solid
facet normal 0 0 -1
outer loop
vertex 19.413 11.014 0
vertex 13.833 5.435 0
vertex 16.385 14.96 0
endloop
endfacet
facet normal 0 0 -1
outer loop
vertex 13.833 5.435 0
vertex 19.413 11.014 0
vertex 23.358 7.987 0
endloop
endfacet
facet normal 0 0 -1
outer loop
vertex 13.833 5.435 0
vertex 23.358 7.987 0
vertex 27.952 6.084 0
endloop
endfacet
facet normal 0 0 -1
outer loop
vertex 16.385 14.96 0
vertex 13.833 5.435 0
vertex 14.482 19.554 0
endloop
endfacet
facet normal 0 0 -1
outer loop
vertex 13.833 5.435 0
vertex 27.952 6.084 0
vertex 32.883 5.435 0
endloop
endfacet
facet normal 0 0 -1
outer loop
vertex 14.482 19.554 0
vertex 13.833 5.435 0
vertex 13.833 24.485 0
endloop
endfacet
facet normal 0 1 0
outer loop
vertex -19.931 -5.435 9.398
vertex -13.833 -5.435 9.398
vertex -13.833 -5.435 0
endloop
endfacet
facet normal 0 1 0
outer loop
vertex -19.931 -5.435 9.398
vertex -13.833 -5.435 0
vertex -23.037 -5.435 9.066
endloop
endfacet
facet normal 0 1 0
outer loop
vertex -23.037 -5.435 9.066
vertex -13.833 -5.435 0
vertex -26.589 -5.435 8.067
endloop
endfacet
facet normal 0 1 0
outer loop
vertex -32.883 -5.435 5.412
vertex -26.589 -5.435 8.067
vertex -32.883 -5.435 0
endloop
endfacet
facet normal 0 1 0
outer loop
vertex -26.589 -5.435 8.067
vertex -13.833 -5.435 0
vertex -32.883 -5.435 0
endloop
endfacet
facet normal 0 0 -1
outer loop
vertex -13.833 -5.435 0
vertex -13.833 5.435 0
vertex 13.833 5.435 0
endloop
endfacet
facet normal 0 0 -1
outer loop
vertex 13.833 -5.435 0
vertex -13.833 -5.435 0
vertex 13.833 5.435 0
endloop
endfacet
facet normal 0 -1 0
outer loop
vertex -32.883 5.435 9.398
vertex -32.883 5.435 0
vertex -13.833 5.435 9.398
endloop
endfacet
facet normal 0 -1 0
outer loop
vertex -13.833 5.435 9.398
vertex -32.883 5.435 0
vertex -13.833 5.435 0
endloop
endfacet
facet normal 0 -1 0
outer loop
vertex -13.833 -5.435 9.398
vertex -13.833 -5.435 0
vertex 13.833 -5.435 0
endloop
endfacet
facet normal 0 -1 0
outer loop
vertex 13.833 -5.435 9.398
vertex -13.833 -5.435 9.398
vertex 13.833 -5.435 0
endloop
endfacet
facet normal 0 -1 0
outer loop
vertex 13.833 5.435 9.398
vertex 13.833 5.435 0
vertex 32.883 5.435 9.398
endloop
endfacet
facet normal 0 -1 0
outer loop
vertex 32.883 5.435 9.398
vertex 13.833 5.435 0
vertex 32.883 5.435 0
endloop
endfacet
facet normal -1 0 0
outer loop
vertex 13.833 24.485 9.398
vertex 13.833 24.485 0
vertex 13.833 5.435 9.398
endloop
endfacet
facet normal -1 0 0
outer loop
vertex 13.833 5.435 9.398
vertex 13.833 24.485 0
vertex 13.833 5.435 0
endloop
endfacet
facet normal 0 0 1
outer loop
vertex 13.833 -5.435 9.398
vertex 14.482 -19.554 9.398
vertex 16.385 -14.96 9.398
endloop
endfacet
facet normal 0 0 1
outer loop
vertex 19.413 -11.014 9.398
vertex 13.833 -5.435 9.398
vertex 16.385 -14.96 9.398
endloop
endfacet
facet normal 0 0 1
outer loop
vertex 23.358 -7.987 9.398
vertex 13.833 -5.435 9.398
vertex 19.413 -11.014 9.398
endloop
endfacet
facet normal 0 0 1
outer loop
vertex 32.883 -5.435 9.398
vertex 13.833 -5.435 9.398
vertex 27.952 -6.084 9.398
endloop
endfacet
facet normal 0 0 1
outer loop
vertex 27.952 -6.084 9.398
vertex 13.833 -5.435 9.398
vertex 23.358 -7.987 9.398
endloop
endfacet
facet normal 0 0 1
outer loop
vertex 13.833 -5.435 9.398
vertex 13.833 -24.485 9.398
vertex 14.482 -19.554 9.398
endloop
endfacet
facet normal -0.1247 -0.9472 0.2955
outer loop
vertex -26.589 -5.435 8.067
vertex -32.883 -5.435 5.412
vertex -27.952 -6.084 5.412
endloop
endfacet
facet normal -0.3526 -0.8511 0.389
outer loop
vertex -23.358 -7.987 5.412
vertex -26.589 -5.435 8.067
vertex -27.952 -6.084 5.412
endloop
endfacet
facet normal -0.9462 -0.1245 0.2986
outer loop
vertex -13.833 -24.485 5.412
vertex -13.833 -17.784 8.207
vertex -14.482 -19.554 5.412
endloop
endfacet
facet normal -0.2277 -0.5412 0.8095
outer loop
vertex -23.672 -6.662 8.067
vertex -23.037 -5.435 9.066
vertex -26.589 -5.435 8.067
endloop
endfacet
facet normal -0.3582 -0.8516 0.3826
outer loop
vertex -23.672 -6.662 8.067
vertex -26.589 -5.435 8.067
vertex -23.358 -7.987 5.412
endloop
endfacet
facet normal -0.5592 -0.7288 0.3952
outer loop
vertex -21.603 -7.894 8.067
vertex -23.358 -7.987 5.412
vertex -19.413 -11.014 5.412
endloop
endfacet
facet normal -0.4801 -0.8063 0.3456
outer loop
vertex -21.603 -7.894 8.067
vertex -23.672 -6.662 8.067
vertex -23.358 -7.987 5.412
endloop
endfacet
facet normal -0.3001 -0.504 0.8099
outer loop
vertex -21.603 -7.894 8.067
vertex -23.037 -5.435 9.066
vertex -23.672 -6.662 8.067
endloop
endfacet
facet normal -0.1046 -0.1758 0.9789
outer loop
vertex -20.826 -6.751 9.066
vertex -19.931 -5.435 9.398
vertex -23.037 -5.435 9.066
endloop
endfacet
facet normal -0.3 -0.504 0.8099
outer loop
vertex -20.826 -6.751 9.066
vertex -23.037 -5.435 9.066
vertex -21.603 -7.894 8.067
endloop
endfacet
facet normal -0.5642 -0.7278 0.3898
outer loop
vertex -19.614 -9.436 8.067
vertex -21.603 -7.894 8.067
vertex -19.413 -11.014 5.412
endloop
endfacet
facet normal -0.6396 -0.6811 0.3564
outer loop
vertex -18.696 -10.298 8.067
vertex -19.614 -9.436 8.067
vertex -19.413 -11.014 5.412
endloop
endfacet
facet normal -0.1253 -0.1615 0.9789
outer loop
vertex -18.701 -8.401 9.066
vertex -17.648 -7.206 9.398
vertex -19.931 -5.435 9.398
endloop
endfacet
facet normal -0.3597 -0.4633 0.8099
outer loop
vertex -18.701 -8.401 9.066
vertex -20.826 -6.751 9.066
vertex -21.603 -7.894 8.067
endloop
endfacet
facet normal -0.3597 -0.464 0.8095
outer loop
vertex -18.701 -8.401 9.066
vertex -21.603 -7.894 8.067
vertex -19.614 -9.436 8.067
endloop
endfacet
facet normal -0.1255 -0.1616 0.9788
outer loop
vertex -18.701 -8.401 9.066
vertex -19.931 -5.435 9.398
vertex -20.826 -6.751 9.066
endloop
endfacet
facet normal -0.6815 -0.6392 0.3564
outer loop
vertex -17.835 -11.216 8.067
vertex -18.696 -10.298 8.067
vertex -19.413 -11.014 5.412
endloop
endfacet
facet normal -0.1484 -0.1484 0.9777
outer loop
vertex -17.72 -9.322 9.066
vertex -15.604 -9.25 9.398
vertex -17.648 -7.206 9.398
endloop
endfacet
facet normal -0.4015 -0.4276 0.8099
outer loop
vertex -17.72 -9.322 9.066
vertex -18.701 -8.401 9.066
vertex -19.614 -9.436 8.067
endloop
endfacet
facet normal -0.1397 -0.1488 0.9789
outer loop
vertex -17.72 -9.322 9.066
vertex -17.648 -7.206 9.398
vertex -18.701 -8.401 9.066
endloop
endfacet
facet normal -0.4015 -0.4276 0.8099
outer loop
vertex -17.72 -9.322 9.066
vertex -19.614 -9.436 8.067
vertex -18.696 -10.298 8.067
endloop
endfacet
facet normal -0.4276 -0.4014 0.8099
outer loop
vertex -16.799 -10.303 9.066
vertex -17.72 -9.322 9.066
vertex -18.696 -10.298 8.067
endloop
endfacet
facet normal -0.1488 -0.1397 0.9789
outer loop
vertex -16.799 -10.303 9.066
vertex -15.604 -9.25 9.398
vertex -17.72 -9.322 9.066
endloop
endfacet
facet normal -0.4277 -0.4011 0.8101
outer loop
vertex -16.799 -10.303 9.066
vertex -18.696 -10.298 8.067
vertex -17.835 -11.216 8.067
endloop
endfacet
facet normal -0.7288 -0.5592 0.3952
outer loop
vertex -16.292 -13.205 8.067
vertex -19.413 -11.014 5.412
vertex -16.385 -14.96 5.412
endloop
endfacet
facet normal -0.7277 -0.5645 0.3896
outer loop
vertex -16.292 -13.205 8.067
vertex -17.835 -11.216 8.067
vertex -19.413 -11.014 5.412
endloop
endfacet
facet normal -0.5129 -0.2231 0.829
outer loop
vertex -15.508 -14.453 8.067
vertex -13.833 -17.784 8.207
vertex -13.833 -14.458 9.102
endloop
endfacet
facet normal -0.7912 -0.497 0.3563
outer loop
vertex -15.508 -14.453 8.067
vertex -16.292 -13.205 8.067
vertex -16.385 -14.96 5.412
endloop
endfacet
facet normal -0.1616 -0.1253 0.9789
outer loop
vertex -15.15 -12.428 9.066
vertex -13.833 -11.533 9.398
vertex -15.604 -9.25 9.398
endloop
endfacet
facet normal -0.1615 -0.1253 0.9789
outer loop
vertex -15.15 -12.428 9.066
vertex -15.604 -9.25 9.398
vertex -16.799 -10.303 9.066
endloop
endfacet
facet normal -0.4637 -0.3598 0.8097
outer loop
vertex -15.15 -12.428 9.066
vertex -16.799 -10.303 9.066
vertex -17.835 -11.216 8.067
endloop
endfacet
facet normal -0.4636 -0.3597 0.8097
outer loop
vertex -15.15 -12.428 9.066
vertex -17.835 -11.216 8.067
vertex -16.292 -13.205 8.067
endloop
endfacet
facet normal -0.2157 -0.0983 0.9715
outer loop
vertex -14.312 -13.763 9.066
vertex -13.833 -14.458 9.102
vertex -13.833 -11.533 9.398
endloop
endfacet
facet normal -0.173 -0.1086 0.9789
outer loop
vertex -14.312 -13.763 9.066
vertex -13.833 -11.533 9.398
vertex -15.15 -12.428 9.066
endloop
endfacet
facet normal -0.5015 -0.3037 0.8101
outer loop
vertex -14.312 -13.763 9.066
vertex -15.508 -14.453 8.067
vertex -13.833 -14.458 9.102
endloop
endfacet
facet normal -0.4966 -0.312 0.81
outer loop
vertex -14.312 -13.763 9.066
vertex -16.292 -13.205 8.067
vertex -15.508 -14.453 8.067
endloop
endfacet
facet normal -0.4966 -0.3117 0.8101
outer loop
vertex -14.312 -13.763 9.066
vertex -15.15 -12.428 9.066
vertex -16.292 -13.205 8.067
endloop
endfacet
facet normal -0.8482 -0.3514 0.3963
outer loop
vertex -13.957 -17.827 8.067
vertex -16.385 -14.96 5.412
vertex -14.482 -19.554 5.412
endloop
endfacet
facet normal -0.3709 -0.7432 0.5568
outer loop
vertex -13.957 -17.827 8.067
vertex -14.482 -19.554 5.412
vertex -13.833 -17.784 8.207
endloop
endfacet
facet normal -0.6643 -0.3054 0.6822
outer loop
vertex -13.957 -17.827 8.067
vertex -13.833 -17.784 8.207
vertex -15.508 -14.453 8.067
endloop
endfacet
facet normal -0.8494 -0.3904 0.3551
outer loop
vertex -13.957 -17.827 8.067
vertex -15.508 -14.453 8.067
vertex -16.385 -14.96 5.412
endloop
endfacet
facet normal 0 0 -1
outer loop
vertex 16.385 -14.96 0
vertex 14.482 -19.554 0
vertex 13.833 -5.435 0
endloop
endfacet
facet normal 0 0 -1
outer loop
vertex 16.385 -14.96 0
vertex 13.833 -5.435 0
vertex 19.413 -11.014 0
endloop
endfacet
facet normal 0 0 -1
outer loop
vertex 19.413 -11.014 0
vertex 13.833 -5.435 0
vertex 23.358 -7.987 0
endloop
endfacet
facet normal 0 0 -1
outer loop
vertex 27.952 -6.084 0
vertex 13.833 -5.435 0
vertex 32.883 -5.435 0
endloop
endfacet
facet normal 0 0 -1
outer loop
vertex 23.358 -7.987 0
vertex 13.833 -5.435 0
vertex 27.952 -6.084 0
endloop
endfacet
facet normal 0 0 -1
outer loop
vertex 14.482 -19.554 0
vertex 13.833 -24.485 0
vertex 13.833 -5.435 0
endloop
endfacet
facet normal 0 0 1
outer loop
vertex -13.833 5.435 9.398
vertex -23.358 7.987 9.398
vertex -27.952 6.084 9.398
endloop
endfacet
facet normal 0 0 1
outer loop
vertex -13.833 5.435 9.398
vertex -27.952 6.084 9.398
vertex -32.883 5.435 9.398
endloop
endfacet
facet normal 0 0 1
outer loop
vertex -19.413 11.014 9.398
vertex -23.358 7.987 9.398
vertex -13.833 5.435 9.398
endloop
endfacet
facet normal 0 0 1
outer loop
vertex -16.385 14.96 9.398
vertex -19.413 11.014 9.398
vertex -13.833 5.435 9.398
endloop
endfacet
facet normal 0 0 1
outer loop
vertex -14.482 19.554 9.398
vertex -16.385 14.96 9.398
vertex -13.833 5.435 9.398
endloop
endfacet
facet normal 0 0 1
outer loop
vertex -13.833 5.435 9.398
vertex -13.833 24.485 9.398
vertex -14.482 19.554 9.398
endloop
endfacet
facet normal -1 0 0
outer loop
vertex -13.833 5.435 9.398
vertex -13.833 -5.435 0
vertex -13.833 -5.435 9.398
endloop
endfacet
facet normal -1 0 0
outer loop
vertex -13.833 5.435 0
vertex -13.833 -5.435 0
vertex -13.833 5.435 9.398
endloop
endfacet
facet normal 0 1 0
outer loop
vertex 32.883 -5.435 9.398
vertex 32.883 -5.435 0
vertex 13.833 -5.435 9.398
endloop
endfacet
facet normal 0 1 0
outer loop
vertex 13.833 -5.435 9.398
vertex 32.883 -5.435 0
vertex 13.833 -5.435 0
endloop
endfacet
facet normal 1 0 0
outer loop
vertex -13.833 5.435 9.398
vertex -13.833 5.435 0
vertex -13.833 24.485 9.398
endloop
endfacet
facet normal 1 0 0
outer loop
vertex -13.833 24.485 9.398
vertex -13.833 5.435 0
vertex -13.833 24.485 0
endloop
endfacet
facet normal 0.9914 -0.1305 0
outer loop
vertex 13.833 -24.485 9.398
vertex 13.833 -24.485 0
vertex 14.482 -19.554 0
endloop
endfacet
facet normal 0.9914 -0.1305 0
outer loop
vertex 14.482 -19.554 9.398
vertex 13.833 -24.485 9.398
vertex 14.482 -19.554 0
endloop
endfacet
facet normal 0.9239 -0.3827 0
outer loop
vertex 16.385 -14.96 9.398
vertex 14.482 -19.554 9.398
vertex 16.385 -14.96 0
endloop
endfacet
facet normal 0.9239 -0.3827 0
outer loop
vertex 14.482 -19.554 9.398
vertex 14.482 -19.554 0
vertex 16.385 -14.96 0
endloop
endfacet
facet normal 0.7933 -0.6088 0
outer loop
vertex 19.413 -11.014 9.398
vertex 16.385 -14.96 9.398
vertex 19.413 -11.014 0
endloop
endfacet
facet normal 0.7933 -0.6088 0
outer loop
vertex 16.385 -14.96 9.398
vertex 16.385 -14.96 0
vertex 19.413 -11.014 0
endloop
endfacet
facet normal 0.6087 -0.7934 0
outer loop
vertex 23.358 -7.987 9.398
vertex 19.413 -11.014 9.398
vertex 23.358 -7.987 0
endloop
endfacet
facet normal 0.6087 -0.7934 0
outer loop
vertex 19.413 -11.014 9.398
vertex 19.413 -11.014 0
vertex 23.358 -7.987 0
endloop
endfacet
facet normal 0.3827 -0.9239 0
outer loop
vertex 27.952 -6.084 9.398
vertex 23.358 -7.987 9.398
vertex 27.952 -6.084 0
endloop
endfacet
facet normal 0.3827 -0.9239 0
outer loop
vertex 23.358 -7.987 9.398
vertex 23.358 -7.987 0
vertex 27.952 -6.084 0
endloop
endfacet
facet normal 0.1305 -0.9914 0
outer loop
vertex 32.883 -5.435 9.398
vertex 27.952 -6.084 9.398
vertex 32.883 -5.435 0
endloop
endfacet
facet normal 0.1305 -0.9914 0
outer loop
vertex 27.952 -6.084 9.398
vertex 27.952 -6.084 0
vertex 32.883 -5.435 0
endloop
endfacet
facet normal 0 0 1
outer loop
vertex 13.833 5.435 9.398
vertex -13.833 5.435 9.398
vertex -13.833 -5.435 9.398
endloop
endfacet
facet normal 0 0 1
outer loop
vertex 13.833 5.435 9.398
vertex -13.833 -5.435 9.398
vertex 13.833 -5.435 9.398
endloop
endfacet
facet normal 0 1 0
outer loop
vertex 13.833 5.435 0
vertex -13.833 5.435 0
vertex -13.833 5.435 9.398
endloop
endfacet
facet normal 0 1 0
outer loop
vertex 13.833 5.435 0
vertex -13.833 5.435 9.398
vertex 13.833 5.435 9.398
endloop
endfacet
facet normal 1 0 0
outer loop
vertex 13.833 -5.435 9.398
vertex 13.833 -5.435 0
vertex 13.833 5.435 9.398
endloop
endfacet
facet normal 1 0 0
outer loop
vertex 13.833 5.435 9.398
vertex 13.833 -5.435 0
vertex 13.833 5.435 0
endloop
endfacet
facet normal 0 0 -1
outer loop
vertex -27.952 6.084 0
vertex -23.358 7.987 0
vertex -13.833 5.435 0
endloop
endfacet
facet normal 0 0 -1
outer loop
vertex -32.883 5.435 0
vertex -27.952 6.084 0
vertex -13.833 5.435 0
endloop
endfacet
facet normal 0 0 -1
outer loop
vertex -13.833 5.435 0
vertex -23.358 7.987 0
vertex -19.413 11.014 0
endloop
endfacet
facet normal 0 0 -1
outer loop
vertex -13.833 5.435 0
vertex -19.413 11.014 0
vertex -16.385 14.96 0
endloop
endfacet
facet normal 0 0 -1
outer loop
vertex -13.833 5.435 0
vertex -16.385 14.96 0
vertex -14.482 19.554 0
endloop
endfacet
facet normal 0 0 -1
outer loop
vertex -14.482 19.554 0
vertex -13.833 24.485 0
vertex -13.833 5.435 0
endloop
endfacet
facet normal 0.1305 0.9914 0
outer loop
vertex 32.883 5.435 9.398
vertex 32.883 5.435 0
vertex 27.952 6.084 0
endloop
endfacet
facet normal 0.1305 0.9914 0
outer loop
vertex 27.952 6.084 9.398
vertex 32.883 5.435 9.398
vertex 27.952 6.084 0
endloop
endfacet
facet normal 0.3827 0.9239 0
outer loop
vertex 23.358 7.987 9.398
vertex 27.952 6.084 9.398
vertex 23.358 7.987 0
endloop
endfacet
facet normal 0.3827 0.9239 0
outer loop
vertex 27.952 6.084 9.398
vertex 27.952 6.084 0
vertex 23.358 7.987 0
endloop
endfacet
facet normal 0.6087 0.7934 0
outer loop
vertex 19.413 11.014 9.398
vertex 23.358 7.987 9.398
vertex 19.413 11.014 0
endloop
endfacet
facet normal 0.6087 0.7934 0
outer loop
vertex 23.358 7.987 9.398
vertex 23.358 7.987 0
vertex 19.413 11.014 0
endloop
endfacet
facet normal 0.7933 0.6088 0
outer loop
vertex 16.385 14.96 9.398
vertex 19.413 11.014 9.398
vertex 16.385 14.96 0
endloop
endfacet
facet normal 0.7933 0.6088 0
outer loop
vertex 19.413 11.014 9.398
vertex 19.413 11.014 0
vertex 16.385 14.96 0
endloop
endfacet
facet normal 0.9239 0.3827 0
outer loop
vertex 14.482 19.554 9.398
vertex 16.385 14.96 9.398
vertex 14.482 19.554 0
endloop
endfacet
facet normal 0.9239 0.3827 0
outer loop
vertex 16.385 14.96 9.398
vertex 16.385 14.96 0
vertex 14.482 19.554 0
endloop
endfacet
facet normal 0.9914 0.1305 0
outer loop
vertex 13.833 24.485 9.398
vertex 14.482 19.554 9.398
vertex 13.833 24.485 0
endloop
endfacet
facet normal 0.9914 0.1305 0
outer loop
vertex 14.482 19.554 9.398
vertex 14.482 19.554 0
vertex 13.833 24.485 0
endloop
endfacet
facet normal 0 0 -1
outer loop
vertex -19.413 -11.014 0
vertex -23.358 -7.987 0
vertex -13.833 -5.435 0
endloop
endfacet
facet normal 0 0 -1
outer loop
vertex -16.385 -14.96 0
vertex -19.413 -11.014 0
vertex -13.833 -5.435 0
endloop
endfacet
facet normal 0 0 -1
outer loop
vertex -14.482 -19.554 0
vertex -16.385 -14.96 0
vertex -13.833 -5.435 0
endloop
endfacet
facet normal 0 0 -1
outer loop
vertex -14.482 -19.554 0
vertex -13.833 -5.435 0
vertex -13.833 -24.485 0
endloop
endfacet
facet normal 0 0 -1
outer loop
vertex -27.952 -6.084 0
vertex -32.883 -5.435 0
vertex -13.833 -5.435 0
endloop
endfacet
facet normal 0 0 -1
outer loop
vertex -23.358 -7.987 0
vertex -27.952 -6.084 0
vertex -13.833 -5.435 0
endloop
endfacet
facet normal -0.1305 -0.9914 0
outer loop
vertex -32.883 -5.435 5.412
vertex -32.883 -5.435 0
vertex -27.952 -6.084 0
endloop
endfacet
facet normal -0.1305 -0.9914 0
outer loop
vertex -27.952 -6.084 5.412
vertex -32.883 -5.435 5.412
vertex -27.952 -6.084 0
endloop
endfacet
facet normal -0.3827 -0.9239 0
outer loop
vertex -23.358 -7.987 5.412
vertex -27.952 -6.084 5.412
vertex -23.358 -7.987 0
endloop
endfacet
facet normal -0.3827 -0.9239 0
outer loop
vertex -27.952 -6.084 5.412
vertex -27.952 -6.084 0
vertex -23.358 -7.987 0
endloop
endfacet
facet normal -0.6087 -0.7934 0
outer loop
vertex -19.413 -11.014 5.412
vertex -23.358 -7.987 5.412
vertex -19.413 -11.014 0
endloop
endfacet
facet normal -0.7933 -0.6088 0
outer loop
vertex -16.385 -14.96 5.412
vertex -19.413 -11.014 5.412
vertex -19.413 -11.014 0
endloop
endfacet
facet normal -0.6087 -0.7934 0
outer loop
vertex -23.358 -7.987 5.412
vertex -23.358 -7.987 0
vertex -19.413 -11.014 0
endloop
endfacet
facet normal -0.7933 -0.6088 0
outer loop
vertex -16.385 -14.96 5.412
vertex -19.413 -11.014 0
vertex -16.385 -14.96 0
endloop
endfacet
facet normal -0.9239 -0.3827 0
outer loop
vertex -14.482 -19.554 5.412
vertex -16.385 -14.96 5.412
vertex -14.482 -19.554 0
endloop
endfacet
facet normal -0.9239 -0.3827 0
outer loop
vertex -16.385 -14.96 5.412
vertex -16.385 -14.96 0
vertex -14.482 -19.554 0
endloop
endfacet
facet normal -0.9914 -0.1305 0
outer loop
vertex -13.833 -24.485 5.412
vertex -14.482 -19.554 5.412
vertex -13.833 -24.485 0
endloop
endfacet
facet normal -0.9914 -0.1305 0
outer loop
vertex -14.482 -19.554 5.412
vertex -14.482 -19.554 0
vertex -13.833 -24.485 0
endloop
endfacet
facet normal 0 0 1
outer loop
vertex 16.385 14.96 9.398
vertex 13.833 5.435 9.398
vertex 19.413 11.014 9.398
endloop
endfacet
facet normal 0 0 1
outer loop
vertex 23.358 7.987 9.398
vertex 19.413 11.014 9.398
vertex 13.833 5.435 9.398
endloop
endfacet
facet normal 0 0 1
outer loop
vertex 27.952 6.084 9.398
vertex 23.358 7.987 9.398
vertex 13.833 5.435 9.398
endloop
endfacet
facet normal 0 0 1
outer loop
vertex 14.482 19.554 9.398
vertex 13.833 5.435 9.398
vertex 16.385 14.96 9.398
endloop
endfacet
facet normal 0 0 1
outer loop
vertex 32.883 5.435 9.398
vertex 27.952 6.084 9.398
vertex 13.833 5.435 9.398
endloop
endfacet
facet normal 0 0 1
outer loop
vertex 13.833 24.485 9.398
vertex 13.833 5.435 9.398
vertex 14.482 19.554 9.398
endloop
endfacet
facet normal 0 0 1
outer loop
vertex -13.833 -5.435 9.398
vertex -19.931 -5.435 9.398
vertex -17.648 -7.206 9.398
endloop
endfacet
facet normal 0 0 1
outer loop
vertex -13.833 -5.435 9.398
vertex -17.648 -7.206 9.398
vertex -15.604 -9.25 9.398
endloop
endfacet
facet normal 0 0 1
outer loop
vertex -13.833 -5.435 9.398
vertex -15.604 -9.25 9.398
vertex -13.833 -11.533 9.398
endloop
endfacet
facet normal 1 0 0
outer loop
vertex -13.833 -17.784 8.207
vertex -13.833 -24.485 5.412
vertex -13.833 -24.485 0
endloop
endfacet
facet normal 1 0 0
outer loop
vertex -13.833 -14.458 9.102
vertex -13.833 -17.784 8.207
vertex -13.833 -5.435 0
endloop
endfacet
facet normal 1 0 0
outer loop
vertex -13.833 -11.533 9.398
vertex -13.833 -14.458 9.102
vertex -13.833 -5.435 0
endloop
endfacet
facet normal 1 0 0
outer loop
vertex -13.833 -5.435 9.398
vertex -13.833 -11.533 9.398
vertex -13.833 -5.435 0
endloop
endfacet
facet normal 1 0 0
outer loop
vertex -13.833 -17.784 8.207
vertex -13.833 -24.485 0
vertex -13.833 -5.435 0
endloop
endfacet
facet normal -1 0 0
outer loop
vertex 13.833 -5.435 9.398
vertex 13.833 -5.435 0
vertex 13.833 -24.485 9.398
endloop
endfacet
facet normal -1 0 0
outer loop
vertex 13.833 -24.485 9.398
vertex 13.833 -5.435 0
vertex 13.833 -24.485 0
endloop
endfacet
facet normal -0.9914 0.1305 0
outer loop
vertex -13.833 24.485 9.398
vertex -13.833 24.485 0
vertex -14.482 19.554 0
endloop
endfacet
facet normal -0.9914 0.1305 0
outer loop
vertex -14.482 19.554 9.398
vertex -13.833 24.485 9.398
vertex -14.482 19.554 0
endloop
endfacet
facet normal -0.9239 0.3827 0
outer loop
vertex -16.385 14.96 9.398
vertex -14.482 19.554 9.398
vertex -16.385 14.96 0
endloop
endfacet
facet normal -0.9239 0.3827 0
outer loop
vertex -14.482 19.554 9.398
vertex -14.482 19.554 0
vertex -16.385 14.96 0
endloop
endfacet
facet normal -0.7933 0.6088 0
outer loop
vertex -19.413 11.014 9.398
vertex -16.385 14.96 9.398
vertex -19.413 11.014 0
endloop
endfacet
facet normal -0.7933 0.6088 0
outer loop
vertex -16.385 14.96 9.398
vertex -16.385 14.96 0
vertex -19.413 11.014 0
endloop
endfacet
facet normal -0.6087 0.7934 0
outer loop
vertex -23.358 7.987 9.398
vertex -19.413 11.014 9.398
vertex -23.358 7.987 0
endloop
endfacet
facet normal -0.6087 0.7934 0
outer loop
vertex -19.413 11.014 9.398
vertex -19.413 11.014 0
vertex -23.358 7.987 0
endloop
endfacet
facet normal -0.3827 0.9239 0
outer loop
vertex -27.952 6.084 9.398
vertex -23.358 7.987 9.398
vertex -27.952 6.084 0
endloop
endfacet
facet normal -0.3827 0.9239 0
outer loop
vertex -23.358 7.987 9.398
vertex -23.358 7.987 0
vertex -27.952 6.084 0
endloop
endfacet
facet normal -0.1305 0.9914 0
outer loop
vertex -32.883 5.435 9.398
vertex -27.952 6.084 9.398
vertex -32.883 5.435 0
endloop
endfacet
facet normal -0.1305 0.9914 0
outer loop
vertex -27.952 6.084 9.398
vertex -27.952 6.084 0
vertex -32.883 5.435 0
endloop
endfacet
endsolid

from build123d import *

# Parameters (mm, degrees)
F1_DEPTH = 9.398
F0_W     = 27.665923667
F0_H     = 10.869703573
F2_R     = 3.9858665915


with BuildPart() as f1:
    # F0 (on Top) → F1 (new body)
    with BuildSketch(Plane.XY):
        with BuildLine():
            Line((-32.8829618335, 5.4348517865), (-13.8329618335, 5.4348517865))
            Line((-13.8329618335, 5.4348517865), (-13.8329618335, 24.4848517865))
            ThreePointArc((-13.8329618335, 24.4848517865), (-19.4125776519, 11.0144676049), (-32.8829618335, 5.4348517865))
        make_face()
    extrude(amount=F1_DEPTH)


with BuildPart() as f1b:
    # F0 (on Top) → F1, piece 2 (new body)
    with BuildSketch(Plane.XY):
        with BuildLine():
            ThreePointArc((32.8829618335, 5.4348517865), (19.4125776519, 11.0144676049), (13.8329618335, 24.4848517865))
            Line((13.8329618335, 24.4848517865), (13.8329618335, 5.4348517865))
            Line((13.8329618335, 5.4348517865), (32.8829618335, 5.4348517865))
        make_face()
    extrude(amount=F1_DEPTH)


with BuildPart() as f1c:
    # F0 (on Top) → F1, piece 3 (new body)
    with BuildSketch(Plane.XY):
        with BuildLine():
            Line((32.8829618335, -5.4348517865), (13.8329618335, -5.4348517865))
            Line((13.8329618335, -5.4348517865), (13.8329618335, -24.4848517865))
            ThreePointArc((13.8329618335, -24.4848517865), (19.4125776519, -11.0144676049), (32.8829618335, -5.4348517865))
        make_face()
    extrude(amount=F1_DEPTH)


with BuildPart() as f1d:
    # F0 (on Top) → F1, piece 4 (new body)
    with BuildSketch(Plane.XY):
        with BuildLine():
            Line((-13.8329618335, -24.4848517865), (-13.8329618335, -5.4348517865))
            Line((-13.8329618335, -5.4348517865), (-32.8829618335, -5.4348517865))
            ThreePointArc((-32.8829618335, -5.4348517865), (-19.4125776519, -11.0144676049), (-13.8329618335, -24.4848517865))
        make_face()
    extrude(amount=F1_DEPTH)

    # F2
    f2_edges = [f1d.edges().sort_by_distance(p)[0] for p in [
        (-19.412578, -11.014468, 9.398),
    ]]
    fillet(f2_edges, radius=F2_R)


with BuildPart() as f1e:
    # F0 (on Top) → F1, piece 5 (new body)
    with BuildSketch(Plane.XY):
        Rectangle(F0_W, F0_H)
    extrude(amount=F1_DEPTH)


solid = Compound([f1.part, f1b.part, f1c.part, f1d.part, f1e.part])
